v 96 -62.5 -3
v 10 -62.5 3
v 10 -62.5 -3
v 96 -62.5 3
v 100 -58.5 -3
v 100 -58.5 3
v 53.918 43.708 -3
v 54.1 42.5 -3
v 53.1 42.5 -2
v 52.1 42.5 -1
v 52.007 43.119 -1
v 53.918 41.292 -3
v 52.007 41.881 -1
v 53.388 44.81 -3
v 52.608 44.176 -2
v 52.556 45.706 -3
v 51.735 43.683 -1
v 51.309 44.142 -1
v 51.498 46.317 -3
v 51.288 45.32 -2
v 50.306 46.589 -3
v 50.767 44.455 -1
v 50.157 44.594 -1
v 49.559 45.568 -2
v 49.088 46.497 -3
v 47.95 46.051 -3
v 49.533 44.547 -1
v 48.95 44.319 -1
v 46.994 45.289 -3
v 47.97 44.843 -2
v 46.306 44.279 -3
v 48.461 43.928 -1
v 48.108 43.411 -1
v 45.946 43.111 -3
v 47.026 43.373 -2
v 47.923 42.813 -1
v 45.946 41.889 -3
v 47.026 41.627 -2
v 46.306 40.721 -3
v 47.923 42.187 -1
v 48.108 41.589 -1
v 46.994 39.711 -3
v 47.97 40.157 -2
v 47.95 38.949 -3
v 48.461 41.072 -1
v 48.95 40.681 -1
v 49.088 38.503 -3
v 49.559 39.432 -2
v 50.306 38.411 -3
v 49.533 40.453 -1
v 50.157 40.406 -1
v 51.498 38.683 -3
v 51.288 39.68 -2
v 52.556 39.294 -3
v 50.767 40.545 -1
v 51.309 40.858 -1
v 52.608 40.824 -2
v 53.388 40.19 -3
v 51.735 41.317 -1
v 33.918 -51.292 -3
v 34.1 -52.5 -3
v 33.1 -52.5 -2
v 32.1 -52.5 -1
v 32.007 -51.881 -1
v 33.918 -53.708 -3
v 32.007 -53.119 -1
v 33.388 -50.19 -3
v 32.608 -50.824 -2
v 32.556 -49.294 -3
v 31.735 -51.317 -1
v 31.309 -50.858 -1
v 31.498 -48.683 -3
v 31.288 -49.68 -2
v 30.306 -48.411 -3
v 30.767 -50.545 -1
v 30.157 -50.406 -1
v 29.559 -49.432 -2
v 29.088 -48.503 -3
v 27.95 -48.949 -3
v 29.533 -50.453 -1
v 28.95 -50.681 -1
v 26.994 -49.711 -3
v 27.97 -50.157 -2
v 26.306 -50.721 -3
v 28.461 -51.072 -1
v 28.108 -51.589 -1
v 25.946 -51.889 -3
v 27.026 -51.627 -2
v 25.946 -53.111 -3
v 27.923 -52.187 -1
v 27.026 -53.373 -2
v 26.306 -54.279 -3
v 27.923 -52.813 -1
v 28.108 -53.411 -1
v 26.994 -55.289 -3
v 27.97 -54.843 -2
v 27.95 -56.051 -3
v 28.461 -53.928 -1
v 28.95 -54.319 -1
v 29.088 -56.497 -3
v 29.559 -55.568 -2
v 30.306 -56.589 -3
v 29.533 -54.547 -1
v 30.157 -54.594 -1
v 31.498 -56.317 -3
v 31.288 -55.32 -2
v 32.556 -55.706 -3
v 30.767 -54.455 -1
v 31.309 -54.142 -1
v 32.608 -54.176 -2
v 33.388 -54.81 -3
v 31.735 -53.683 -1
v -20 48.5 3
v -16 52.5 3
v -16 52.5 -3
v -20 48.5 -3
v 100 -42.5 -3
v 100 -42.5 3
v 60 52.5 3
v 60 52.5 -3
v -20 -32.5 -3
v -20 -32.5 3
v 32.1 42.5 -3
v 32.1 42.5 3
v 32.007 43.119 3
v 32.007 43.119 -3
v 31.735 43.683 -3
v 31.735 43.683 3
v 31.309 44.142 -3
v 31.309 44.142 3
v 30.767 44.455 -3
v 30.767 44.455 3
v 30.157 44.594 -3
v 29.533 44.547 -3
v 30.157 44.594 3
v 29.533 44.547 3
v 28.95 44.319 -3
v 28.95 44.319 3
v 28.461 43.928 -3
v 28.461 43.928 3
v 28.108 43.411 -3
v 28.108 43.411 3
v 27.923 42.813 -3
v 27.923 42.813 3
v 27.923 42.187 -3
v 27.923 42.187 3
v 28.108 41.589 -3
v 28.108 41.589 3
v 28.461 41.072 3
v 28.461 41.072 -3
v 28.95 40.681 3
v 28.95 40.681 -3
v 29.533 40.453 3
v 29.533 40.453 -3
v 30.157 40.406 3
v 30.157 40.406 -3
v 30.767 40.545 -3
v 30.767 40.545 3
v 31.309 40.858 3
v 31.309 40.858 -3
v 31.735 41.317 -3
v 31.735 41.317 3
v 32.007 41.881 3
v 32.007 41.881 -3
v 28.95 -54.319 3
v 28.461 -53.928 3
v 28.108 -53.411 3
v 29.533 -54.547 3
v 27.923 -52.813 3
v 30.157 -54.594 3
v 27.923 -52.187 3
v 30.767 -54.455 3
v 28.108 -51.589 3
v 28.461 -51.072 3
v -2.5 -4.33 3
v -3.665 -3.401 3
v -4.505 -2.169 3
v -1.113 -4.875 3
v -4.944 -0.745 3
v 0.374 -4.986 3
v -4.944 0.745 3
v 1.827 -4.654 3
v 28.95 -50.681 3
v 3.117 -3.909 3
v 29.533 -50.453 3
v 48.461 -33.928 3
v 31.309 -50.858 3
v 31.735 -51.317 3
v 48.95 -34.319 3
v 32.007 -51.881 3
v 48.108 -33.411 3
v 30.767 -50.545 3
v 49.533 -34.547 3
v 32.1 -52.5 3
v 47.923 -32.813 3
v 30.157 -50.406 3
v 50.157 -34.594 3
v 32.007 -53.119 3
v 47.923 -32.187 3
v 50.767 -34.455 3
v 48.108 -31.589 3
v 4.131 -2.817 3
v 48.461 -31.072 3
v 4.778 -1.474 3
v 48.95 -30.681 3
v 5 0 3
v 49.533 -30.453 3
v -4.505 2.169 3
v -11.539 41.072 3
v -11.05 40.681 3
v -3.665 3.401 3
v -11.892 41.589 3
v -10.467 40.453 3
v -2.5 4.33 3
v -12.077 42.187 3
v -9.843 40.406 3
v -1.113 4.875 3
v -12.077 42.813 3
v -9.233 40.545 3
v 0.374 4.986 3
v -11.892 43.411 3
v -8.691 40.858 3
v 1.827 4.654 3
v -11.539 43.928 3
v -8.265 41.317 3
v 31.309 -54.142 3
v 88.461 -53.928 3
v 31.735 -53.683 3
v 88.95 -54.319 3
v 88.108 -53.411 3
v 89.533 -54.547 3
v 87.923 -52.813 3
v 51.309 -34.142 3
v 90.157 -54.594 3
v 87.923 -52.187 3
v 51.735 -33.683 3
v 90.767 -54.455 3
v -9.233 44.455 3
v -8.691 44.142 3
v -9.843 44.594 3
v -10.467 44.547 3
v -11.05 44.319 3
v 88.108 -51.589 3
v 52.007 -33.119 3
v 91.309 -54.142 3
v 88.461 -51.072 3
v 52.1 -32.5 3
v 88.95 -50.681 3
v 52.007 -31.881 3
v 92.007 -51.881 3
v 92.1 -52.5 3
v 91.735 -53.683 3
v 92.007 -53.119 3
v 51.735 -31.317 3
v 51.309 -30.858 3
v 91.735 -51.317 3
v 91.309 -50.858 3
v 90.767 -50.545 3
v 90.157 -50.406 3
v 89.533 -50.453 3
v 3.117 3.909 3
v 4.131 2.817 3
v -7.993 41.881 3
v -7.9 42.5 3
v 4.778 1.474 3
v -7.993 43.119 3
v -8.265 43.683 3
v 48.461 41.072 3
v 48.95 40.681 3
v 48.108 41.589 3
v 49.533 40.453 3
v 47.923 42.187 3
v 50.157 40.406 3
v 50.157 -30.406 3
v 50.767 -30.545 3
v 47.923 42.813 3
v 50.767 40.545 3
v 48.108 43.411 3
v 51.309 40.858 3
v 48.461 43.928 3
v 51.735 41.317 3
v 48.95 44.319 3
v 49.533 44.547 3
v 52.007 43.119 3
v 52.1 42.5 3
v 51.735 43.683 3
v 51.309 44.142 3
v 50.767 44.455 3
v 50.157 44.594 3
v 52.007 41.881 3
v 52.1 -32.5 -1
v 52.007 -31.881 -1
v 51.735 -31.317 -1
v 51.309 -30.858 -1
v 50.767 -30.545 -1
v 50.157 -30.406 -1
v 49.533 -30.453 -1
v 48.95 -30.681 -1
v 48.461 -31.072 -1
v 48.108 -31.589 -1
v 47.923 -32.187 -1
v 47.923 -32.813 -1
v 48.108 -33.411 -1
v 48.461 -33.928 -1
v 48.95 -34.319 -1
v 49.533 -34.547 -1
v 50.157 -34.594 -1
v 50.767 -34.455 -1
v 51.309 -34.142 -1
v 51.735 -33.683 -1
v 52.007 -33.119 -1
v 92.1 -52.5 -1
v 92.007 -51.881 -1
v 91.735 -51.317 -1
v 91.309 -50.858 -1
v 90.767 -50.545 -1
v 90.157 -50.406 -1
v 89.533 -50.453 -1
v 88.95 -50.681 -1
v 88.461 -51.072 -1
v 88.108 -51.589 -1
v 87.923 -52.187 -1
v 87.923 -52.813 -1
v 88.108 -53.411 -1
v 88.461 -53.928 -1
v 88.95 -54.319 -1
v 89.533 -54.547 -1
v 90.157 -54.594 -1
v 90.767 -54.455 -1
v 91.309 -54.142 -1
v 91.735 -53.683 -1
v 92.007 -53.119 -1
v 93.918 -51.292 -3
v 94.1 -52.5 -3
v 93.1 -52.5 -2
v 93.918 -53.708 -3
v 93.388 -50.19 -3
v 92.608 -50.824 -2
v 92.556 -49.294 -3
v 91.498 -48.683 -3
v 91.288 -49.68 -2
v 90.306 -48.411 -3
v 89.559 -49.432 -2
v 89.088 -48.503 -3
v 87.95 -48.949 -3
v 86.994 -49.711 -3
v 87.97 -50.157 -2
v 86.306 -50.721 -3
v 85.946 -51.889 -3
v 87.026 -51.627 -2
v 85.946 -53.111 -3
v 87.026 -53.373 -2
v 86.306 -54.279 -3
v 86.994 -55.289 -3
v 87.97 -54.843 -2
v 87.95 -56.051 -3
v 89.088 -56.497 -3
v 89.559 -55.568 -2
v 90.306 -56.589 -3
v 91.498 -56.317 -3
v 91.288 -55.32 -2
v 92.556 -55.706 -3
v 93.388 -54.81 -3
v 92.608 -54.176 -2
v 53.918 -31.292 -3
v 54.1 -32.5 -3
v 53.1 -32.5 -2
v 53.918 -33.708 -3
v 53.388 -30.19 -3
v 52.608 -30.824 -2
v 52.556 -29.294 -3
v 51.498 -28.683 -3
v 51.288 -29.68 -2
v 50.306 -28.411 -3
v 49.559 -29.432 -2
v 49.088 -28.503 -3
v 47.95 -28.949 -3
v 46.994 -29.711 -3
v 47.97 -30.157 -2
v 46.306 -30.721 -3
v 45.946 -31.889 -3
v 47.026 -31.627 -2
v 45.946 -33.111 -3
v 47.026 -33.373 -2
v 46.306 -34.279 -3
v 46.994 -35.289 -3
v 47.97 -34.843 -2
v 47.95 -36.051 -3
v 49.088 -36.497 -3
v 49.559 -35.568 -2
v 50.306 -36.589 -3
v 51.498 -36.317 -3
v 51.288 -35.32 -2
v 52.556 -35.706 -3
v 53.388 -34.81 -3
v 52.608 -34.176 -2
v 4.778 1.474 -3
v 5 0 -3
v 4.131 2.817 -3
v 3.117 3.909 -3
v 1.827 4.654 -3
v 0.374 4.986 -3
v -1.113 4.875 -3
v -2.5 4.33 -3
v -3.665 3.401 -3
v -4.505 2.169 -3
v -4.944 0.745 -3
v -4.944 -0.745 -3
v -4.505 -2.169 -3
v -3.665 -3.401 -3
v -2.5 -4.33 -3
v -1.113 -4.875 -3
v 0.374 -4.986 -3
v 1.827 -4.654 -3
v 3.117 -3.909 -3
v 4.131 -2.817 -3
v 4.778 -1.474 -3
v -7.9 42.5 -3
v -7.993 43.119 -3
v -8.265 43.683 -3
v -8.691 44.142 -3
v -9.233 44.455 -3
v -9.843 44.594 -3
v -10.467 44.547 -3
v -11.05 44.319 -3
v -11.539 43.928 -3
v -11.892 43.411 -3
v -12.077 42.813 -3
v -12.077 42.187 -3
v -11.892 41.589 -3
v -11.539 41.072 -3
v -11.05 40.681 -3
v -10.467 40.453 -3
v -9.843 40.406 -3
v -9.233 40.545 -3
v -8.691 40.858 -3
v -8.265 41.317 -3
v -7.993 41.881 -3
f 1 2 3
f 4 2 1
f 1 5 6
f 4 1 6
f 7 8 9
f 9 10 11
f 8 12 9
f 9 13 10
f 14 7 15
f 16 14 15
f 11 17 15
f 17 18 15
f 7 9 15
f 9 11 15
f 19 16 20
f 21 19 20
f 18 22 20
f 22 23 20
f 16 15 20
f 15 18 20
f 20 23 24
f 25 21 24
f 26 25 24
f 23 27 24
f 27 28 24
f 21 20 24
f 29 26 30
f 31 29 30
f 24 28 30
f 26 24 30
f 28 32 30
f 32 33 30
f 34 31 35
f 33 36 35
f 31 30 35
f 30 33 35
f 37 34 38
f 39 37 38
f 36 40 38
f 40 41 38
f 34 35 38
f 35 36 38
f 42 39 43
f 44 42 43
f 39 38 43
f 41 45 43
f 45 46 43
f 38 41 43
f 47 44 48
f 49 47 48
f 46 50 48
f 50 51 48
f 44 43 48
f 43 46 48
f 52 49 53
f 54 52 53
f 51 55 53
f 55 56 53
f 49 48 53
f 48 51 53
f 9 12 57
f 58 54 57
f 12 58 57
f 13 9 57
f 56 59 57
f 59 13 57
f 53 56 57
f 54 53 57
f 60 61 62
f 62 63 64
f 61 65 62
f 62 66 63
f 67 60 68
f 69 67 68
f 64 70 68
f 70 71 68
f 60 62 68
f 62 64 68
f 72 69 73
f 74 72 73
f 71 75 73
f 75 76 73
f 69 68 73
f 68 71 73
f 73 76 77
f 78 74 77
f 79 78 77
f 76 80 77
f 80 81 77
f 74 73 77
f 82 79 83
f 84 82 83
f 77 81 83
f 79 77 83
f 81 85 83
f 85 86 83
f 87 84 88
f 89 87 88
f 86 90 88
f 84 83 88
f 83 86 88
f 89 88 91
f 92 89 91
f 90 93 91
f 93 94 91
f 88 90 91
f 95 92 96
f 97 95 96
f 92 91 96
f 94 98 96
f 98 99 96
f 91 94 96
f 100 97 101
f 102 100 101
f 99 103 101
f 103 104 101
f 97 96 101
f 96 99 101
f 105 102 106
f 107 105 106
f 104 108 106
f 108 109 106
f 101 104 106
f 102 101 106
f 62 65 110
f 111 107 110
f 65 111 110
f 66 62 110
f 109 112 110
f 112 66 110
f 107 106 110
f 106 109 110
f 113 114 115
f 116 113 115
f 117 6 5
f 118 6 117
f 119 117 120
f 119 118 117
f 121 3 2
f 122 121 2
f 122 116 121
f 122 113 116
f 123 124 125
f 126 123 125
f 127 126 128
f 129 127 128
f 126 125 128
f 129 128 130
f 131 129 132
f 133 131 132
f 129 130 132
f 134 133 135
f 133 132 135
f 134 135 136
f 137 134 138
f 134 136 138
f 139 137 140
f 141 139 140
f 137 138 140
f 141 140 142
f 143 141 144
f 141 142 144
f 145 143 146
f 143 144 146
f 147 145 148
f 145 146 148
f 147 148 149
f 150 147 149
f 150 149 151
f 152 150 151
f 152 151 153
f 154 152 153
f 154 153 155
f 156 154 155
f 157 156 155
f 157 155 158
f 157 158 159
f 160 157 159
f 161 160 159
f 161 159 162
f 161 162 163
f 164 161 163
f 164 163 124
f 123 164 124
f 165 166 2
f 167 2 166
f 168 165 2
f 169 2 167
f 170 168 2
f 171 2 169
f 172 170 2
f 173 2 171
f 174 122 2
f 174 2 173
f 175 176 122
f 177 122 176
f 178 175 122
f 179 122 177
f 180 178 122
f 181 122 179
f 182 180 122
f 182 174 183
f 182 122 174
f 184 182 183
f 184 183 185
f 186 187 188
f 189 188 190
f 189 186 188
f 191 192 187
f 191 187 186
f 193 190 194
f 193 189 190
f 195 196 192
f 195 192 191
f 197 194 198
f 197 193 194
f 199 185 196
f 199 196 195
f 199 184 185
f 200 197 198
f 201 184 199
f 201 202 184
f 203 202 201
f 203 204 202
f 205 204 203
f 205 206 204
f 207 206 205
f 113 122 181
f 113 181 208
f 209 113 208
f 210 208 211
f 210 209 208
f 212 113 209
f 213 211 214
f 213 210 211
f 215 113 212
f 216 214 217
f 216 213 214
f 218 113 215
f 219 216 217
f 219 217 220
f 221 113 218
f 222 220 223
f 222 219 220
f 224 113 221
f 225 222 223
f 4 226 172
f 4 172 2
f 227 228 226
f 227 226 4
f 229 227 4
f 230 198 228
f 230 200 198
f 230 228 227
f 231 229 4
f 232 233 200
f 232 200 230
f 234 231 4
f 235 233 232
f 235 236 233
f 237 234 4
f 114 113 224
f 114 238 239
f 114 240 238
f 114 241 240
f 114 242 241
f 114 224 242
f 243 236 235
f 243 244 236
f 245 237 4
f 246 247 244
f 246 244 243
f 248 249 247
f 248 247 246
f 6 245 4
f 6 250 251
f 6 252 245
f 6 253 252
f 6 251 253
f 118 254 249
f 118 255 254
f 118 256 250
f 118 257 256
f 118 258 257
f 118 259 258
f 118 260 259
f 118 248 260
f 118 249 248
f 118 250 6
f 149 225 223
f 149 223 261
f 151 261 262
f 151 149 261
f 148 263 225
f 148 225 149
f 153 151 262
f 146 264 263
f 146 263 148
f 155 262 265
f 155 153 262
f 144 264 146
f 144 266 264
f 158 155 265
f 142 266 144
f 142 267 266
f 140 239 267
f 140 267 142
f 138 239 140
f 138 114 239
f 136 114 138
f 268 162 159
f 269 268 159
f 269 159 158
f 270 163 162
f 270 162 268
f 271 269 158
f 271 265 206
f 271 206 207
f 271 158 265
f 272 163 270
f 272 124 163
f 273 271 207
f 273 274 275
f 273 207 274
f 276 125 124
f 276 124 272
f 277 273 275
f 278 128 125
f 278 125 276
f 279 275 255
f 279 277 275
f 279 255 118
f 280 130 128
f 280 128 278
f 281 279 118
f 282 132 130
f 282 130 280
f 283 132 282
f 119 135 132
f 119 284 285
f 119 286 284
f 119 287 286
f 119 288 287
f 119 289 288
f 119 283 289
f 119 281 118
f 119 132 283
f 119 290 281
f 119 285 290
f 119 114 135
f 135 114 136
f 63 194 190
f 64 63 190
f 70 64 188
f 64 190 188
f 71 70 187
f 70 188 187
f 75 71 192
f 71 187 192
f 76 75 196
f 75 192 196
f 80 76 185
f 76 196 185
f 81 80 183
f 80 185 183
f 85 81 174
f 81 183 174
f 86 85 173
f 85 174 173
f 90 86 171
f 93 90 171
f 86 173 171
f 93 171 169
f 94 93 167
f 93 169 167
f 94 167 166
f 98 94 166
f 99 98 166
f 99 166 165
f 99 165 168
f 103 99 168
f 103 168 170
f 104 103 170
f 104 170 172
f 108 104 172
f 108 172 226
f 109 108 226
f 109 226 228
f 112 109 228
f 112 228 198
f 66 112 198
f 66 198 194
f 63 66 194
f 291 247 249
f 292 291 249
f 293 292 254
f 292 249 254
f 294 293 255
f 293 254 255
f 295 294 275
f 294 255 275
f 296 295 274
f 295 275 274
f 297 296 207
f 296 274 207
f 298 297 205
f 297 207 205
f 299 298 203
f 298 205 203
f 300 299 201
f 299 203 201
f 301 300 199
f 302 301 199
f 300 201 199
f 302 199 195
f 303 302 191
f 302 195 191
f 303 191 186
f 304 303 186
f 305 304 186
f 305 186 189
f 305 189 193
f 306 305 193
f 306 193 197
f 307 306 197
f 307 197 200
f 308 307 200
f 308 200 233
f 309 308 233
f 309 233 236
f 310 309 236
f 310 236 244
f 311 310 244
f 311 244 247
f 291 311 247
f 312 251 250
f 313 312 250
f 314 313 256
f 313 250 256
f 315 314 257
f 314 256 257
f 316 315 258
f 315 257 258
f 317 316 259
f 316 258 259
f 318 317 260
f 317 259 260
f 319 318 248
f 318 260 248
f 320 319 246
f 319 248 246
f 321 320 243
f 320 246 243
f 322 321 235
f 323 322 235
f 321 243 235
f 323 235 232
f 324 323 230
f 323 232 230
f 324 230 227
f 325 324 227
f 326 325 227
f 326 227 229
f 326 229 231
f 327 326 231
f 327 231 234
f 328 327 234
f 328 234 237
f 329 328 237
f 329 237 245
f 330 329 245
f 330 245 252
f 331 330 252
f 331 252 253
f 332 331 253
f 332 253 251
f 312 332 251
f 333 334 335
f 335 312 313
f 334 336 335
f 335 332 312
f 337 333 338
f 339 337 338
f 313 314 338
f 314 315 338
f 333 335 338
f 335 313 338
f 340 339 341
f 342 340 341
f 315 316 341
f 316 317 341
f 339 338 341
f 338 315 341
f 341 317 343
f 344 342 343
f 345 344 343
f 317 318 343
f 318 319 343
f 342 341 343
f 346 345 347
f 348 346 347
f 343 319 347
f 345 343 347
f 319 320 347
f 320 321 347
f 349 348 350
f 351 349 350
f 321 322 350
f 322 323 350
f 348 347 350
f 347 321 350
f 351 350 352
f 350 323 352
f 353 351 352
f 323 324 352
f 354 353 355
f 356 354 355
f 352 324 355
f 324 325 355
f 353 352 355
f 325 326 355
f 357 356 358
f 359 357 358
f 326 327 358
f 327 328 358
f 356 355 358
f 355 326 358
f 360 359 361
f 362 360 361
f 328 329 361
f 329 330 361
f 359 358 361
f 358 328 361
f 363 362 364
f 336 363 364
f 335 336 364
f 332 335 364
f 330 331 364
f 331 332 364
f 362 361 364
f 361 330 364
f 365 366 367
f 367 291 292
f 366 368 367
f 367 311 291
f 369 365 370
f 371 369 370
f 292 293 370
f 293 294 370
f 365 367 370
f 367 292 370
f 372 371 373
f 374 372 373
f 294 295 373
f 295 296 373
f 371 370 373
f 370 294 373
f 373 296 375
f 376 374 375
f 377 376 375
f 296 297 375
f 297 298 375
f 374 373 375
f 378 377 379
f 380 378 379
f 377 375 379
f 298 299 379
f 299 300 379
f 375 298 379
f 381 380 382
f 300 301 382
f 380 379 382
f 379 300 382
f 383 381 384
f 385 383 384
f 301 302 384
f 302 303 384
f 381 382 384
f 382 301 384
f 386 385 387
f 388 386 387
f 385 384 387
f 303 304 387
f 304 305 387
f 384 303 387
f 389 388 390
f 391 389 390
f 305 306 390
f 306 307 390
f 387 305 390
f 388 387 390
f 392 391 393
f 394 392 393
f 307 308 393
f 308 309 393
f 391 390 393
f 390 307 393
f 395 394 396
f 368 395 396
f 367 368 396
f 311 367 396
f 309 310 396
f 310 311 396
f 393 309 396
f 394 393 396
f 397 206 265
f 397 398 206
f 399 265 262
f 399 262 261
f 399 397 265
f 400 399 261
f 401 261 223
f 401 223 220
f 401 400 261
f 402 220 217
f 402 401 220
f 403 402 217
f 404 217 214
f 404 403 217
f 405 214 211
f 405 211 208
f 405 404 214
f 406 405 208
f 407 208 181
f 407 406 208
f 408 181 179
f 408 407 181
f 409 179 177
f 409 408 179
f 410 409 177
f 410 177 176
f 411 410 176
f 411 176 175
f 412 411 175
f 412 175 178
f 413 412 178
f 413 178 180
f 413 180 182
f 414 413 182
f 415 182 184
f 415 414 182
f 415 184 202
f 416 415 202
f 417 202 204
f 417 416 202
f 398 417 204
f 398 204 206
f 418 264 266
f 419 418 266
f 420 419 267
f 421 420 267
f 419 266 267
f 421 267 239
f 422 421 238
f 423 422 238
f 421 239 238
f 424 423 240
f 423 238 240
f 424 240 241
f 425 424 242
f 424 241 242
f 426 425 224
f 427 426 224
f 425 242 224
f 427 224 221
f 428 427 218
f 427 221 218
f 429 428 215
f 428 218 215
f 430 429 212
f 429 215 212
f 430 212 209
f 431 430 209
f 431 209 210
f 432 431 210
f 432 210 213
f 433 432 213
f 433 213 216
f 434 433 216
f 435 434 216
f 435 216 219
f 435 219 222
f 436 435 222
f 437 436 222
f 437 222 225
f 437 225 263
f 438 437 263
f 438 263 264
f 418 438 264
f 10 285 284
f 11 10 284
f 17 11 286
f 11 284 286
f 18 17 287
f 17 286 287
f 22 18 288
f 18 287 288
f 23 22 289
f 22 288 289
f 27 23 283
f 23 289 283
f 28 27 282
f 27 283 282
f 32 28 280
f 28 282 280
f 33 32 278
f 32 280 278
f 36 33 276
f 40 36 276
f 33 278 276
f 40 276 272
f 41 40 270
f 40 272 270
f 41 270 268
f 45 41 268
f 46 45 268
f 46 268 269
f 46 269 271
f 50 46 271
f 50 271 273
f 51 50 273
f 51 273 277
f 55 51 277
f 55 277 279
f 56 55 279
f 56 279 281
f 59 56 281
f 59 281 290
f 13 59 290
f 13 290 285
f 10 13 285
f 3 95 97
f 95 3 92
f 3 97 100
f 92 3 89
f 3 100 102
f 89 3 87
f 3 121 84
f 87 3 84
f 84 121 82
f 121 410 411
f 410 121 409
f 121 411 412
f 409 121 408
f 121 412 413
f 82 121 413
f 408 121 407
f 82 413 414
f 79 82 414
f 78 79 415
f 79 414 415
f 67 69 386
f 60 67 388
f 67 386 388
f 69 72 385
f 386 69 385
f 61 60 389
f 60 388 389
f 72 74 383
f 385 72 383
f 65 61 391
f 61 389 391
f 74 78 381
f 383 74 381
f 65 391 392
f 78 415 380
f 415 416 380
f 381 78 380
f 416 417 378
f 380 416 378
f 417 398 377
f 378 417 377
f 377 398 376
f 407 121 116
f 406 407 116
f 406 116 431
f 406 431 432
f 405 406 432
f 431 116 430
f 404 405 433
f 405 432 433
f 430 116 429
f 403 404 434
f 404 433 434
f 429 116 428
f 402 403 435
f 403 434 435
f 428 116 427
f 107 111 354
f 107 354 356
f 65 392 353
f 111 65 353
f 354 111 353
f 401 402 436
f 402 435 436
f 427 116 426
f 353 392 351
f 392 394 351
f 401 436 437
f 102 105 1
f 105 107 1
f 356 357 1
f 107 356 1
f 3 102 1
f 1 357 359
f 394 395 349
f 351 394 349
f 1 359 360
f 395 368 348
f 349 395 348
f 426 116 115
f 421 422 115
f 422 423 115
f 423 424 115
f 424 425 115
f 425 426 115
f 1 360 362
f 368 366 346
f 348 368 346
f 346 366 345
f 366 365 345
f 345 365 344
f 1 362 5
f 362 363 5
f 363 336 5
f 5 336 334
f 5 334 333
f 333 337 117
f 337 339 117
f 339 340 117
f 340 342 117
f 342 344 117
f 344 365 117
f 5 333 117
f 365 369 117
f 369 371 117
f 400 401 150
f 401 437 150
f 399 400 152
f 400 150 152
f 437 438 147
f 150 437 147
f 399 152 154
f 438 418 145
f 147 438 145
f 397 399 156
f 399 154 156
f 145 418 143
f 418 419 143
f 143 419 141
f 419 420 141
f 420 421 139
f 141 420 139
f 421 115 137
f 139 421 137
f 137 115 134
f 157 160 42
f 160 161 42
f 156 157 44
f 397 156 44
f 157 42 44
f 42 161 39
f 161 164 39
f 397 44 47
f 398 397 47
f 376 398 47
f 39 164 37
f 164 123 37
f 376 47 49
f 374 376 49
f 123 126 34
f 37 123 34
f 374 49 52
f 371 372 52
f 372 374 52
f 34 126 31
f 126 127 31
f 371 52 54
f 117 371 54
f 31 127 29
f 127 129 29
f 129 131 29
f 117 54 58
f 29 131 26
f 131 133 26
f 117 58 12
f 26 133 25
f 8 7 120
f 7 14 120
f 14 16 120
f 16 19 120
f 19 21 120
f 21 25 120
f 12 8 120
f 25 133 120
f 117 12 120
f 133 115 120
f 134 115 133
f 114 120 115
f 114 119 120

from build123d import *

# Parameters (mm, degrees)
SKETCH_1_R          = 5
EXTRUDE_1_DEPTH     = 3
SKETCH_2_R          = 2.1
CUT_EXTRUDE_1_DEPTH = 119.077305186
CHAMFER_1_SIZE      = 30
CHAMFER_3_SIZE      = 4
CHAMFER_2_SIZE      = 2


with BuildPart() as part:
    # 草图1 → 凸台-拉伸1 (new, symmetric)
    with BuildSketch(Plane.XY):
        Polygon((-20, 52.5), (-20, -62.5), (100, -62.5), (100, -42.5), (60, 52.5), align=None)
        Circle(SKETCH_1_R, mode=Mode.SUBTRACT)
    extrude(amount=EXTRUDE_1_DEPTH, both=True)

    # 草图2 → 切除-拉伸1 (cut, through all)
    with BuildSketch(Plane.XY.offset(3)):
        with Locations((-10, 42.5)):
            Circle(SKETCH_2_R)
        with Locations((30, 42.5)):
            Circle(SKETCH_2_R)
        with Locations((50, 42.5)):
            Circle(SKETCH_2_R)
        with Locations((50, -32.5)):
            Circle(SKETCH_2_R)
        with Locations((30, -52.5)):
            Circle(SKETCH_2_R)
        with Locations((90, -52.5)):
            Circle(SKETCH_2_R)
    extrude(amount=-CUT_EXTRUDE_1_DEPTH, mode=Mode.SUBTRACT)

    # 倒角1
    chamfer_1_edges = [part.edges().sort_by_distance(p)[0] for p in [
        (-20, -62.5, 0),
    ]]
    chamfer(chamfer_1_edges, length=CHAMFER_1_SIZE)

    # 倒角3
    chamfer_3_edges = [part.edges().sort_by_distance(p)[0] for p in [
        (100, -62.5, 0),
        (-20, 52.5, 0),
    ]]
    chamfer(chamfer_3_edges, length=CHAMFER_3_SIZE)

    # 倒角2
    chamfer_2_edges = [part.edges().sort_by_distance(p)[0] for p in [
        (47.9, 42.5, -3),
        (47.9, -32.5, -3),
        (27.9, -52.5, -3),
        (87.9, -52.5, -3),
    ]]
    chamfer(chamfer_2_edges, length=CHAMFER_2_SIZE)


solid = part.part
